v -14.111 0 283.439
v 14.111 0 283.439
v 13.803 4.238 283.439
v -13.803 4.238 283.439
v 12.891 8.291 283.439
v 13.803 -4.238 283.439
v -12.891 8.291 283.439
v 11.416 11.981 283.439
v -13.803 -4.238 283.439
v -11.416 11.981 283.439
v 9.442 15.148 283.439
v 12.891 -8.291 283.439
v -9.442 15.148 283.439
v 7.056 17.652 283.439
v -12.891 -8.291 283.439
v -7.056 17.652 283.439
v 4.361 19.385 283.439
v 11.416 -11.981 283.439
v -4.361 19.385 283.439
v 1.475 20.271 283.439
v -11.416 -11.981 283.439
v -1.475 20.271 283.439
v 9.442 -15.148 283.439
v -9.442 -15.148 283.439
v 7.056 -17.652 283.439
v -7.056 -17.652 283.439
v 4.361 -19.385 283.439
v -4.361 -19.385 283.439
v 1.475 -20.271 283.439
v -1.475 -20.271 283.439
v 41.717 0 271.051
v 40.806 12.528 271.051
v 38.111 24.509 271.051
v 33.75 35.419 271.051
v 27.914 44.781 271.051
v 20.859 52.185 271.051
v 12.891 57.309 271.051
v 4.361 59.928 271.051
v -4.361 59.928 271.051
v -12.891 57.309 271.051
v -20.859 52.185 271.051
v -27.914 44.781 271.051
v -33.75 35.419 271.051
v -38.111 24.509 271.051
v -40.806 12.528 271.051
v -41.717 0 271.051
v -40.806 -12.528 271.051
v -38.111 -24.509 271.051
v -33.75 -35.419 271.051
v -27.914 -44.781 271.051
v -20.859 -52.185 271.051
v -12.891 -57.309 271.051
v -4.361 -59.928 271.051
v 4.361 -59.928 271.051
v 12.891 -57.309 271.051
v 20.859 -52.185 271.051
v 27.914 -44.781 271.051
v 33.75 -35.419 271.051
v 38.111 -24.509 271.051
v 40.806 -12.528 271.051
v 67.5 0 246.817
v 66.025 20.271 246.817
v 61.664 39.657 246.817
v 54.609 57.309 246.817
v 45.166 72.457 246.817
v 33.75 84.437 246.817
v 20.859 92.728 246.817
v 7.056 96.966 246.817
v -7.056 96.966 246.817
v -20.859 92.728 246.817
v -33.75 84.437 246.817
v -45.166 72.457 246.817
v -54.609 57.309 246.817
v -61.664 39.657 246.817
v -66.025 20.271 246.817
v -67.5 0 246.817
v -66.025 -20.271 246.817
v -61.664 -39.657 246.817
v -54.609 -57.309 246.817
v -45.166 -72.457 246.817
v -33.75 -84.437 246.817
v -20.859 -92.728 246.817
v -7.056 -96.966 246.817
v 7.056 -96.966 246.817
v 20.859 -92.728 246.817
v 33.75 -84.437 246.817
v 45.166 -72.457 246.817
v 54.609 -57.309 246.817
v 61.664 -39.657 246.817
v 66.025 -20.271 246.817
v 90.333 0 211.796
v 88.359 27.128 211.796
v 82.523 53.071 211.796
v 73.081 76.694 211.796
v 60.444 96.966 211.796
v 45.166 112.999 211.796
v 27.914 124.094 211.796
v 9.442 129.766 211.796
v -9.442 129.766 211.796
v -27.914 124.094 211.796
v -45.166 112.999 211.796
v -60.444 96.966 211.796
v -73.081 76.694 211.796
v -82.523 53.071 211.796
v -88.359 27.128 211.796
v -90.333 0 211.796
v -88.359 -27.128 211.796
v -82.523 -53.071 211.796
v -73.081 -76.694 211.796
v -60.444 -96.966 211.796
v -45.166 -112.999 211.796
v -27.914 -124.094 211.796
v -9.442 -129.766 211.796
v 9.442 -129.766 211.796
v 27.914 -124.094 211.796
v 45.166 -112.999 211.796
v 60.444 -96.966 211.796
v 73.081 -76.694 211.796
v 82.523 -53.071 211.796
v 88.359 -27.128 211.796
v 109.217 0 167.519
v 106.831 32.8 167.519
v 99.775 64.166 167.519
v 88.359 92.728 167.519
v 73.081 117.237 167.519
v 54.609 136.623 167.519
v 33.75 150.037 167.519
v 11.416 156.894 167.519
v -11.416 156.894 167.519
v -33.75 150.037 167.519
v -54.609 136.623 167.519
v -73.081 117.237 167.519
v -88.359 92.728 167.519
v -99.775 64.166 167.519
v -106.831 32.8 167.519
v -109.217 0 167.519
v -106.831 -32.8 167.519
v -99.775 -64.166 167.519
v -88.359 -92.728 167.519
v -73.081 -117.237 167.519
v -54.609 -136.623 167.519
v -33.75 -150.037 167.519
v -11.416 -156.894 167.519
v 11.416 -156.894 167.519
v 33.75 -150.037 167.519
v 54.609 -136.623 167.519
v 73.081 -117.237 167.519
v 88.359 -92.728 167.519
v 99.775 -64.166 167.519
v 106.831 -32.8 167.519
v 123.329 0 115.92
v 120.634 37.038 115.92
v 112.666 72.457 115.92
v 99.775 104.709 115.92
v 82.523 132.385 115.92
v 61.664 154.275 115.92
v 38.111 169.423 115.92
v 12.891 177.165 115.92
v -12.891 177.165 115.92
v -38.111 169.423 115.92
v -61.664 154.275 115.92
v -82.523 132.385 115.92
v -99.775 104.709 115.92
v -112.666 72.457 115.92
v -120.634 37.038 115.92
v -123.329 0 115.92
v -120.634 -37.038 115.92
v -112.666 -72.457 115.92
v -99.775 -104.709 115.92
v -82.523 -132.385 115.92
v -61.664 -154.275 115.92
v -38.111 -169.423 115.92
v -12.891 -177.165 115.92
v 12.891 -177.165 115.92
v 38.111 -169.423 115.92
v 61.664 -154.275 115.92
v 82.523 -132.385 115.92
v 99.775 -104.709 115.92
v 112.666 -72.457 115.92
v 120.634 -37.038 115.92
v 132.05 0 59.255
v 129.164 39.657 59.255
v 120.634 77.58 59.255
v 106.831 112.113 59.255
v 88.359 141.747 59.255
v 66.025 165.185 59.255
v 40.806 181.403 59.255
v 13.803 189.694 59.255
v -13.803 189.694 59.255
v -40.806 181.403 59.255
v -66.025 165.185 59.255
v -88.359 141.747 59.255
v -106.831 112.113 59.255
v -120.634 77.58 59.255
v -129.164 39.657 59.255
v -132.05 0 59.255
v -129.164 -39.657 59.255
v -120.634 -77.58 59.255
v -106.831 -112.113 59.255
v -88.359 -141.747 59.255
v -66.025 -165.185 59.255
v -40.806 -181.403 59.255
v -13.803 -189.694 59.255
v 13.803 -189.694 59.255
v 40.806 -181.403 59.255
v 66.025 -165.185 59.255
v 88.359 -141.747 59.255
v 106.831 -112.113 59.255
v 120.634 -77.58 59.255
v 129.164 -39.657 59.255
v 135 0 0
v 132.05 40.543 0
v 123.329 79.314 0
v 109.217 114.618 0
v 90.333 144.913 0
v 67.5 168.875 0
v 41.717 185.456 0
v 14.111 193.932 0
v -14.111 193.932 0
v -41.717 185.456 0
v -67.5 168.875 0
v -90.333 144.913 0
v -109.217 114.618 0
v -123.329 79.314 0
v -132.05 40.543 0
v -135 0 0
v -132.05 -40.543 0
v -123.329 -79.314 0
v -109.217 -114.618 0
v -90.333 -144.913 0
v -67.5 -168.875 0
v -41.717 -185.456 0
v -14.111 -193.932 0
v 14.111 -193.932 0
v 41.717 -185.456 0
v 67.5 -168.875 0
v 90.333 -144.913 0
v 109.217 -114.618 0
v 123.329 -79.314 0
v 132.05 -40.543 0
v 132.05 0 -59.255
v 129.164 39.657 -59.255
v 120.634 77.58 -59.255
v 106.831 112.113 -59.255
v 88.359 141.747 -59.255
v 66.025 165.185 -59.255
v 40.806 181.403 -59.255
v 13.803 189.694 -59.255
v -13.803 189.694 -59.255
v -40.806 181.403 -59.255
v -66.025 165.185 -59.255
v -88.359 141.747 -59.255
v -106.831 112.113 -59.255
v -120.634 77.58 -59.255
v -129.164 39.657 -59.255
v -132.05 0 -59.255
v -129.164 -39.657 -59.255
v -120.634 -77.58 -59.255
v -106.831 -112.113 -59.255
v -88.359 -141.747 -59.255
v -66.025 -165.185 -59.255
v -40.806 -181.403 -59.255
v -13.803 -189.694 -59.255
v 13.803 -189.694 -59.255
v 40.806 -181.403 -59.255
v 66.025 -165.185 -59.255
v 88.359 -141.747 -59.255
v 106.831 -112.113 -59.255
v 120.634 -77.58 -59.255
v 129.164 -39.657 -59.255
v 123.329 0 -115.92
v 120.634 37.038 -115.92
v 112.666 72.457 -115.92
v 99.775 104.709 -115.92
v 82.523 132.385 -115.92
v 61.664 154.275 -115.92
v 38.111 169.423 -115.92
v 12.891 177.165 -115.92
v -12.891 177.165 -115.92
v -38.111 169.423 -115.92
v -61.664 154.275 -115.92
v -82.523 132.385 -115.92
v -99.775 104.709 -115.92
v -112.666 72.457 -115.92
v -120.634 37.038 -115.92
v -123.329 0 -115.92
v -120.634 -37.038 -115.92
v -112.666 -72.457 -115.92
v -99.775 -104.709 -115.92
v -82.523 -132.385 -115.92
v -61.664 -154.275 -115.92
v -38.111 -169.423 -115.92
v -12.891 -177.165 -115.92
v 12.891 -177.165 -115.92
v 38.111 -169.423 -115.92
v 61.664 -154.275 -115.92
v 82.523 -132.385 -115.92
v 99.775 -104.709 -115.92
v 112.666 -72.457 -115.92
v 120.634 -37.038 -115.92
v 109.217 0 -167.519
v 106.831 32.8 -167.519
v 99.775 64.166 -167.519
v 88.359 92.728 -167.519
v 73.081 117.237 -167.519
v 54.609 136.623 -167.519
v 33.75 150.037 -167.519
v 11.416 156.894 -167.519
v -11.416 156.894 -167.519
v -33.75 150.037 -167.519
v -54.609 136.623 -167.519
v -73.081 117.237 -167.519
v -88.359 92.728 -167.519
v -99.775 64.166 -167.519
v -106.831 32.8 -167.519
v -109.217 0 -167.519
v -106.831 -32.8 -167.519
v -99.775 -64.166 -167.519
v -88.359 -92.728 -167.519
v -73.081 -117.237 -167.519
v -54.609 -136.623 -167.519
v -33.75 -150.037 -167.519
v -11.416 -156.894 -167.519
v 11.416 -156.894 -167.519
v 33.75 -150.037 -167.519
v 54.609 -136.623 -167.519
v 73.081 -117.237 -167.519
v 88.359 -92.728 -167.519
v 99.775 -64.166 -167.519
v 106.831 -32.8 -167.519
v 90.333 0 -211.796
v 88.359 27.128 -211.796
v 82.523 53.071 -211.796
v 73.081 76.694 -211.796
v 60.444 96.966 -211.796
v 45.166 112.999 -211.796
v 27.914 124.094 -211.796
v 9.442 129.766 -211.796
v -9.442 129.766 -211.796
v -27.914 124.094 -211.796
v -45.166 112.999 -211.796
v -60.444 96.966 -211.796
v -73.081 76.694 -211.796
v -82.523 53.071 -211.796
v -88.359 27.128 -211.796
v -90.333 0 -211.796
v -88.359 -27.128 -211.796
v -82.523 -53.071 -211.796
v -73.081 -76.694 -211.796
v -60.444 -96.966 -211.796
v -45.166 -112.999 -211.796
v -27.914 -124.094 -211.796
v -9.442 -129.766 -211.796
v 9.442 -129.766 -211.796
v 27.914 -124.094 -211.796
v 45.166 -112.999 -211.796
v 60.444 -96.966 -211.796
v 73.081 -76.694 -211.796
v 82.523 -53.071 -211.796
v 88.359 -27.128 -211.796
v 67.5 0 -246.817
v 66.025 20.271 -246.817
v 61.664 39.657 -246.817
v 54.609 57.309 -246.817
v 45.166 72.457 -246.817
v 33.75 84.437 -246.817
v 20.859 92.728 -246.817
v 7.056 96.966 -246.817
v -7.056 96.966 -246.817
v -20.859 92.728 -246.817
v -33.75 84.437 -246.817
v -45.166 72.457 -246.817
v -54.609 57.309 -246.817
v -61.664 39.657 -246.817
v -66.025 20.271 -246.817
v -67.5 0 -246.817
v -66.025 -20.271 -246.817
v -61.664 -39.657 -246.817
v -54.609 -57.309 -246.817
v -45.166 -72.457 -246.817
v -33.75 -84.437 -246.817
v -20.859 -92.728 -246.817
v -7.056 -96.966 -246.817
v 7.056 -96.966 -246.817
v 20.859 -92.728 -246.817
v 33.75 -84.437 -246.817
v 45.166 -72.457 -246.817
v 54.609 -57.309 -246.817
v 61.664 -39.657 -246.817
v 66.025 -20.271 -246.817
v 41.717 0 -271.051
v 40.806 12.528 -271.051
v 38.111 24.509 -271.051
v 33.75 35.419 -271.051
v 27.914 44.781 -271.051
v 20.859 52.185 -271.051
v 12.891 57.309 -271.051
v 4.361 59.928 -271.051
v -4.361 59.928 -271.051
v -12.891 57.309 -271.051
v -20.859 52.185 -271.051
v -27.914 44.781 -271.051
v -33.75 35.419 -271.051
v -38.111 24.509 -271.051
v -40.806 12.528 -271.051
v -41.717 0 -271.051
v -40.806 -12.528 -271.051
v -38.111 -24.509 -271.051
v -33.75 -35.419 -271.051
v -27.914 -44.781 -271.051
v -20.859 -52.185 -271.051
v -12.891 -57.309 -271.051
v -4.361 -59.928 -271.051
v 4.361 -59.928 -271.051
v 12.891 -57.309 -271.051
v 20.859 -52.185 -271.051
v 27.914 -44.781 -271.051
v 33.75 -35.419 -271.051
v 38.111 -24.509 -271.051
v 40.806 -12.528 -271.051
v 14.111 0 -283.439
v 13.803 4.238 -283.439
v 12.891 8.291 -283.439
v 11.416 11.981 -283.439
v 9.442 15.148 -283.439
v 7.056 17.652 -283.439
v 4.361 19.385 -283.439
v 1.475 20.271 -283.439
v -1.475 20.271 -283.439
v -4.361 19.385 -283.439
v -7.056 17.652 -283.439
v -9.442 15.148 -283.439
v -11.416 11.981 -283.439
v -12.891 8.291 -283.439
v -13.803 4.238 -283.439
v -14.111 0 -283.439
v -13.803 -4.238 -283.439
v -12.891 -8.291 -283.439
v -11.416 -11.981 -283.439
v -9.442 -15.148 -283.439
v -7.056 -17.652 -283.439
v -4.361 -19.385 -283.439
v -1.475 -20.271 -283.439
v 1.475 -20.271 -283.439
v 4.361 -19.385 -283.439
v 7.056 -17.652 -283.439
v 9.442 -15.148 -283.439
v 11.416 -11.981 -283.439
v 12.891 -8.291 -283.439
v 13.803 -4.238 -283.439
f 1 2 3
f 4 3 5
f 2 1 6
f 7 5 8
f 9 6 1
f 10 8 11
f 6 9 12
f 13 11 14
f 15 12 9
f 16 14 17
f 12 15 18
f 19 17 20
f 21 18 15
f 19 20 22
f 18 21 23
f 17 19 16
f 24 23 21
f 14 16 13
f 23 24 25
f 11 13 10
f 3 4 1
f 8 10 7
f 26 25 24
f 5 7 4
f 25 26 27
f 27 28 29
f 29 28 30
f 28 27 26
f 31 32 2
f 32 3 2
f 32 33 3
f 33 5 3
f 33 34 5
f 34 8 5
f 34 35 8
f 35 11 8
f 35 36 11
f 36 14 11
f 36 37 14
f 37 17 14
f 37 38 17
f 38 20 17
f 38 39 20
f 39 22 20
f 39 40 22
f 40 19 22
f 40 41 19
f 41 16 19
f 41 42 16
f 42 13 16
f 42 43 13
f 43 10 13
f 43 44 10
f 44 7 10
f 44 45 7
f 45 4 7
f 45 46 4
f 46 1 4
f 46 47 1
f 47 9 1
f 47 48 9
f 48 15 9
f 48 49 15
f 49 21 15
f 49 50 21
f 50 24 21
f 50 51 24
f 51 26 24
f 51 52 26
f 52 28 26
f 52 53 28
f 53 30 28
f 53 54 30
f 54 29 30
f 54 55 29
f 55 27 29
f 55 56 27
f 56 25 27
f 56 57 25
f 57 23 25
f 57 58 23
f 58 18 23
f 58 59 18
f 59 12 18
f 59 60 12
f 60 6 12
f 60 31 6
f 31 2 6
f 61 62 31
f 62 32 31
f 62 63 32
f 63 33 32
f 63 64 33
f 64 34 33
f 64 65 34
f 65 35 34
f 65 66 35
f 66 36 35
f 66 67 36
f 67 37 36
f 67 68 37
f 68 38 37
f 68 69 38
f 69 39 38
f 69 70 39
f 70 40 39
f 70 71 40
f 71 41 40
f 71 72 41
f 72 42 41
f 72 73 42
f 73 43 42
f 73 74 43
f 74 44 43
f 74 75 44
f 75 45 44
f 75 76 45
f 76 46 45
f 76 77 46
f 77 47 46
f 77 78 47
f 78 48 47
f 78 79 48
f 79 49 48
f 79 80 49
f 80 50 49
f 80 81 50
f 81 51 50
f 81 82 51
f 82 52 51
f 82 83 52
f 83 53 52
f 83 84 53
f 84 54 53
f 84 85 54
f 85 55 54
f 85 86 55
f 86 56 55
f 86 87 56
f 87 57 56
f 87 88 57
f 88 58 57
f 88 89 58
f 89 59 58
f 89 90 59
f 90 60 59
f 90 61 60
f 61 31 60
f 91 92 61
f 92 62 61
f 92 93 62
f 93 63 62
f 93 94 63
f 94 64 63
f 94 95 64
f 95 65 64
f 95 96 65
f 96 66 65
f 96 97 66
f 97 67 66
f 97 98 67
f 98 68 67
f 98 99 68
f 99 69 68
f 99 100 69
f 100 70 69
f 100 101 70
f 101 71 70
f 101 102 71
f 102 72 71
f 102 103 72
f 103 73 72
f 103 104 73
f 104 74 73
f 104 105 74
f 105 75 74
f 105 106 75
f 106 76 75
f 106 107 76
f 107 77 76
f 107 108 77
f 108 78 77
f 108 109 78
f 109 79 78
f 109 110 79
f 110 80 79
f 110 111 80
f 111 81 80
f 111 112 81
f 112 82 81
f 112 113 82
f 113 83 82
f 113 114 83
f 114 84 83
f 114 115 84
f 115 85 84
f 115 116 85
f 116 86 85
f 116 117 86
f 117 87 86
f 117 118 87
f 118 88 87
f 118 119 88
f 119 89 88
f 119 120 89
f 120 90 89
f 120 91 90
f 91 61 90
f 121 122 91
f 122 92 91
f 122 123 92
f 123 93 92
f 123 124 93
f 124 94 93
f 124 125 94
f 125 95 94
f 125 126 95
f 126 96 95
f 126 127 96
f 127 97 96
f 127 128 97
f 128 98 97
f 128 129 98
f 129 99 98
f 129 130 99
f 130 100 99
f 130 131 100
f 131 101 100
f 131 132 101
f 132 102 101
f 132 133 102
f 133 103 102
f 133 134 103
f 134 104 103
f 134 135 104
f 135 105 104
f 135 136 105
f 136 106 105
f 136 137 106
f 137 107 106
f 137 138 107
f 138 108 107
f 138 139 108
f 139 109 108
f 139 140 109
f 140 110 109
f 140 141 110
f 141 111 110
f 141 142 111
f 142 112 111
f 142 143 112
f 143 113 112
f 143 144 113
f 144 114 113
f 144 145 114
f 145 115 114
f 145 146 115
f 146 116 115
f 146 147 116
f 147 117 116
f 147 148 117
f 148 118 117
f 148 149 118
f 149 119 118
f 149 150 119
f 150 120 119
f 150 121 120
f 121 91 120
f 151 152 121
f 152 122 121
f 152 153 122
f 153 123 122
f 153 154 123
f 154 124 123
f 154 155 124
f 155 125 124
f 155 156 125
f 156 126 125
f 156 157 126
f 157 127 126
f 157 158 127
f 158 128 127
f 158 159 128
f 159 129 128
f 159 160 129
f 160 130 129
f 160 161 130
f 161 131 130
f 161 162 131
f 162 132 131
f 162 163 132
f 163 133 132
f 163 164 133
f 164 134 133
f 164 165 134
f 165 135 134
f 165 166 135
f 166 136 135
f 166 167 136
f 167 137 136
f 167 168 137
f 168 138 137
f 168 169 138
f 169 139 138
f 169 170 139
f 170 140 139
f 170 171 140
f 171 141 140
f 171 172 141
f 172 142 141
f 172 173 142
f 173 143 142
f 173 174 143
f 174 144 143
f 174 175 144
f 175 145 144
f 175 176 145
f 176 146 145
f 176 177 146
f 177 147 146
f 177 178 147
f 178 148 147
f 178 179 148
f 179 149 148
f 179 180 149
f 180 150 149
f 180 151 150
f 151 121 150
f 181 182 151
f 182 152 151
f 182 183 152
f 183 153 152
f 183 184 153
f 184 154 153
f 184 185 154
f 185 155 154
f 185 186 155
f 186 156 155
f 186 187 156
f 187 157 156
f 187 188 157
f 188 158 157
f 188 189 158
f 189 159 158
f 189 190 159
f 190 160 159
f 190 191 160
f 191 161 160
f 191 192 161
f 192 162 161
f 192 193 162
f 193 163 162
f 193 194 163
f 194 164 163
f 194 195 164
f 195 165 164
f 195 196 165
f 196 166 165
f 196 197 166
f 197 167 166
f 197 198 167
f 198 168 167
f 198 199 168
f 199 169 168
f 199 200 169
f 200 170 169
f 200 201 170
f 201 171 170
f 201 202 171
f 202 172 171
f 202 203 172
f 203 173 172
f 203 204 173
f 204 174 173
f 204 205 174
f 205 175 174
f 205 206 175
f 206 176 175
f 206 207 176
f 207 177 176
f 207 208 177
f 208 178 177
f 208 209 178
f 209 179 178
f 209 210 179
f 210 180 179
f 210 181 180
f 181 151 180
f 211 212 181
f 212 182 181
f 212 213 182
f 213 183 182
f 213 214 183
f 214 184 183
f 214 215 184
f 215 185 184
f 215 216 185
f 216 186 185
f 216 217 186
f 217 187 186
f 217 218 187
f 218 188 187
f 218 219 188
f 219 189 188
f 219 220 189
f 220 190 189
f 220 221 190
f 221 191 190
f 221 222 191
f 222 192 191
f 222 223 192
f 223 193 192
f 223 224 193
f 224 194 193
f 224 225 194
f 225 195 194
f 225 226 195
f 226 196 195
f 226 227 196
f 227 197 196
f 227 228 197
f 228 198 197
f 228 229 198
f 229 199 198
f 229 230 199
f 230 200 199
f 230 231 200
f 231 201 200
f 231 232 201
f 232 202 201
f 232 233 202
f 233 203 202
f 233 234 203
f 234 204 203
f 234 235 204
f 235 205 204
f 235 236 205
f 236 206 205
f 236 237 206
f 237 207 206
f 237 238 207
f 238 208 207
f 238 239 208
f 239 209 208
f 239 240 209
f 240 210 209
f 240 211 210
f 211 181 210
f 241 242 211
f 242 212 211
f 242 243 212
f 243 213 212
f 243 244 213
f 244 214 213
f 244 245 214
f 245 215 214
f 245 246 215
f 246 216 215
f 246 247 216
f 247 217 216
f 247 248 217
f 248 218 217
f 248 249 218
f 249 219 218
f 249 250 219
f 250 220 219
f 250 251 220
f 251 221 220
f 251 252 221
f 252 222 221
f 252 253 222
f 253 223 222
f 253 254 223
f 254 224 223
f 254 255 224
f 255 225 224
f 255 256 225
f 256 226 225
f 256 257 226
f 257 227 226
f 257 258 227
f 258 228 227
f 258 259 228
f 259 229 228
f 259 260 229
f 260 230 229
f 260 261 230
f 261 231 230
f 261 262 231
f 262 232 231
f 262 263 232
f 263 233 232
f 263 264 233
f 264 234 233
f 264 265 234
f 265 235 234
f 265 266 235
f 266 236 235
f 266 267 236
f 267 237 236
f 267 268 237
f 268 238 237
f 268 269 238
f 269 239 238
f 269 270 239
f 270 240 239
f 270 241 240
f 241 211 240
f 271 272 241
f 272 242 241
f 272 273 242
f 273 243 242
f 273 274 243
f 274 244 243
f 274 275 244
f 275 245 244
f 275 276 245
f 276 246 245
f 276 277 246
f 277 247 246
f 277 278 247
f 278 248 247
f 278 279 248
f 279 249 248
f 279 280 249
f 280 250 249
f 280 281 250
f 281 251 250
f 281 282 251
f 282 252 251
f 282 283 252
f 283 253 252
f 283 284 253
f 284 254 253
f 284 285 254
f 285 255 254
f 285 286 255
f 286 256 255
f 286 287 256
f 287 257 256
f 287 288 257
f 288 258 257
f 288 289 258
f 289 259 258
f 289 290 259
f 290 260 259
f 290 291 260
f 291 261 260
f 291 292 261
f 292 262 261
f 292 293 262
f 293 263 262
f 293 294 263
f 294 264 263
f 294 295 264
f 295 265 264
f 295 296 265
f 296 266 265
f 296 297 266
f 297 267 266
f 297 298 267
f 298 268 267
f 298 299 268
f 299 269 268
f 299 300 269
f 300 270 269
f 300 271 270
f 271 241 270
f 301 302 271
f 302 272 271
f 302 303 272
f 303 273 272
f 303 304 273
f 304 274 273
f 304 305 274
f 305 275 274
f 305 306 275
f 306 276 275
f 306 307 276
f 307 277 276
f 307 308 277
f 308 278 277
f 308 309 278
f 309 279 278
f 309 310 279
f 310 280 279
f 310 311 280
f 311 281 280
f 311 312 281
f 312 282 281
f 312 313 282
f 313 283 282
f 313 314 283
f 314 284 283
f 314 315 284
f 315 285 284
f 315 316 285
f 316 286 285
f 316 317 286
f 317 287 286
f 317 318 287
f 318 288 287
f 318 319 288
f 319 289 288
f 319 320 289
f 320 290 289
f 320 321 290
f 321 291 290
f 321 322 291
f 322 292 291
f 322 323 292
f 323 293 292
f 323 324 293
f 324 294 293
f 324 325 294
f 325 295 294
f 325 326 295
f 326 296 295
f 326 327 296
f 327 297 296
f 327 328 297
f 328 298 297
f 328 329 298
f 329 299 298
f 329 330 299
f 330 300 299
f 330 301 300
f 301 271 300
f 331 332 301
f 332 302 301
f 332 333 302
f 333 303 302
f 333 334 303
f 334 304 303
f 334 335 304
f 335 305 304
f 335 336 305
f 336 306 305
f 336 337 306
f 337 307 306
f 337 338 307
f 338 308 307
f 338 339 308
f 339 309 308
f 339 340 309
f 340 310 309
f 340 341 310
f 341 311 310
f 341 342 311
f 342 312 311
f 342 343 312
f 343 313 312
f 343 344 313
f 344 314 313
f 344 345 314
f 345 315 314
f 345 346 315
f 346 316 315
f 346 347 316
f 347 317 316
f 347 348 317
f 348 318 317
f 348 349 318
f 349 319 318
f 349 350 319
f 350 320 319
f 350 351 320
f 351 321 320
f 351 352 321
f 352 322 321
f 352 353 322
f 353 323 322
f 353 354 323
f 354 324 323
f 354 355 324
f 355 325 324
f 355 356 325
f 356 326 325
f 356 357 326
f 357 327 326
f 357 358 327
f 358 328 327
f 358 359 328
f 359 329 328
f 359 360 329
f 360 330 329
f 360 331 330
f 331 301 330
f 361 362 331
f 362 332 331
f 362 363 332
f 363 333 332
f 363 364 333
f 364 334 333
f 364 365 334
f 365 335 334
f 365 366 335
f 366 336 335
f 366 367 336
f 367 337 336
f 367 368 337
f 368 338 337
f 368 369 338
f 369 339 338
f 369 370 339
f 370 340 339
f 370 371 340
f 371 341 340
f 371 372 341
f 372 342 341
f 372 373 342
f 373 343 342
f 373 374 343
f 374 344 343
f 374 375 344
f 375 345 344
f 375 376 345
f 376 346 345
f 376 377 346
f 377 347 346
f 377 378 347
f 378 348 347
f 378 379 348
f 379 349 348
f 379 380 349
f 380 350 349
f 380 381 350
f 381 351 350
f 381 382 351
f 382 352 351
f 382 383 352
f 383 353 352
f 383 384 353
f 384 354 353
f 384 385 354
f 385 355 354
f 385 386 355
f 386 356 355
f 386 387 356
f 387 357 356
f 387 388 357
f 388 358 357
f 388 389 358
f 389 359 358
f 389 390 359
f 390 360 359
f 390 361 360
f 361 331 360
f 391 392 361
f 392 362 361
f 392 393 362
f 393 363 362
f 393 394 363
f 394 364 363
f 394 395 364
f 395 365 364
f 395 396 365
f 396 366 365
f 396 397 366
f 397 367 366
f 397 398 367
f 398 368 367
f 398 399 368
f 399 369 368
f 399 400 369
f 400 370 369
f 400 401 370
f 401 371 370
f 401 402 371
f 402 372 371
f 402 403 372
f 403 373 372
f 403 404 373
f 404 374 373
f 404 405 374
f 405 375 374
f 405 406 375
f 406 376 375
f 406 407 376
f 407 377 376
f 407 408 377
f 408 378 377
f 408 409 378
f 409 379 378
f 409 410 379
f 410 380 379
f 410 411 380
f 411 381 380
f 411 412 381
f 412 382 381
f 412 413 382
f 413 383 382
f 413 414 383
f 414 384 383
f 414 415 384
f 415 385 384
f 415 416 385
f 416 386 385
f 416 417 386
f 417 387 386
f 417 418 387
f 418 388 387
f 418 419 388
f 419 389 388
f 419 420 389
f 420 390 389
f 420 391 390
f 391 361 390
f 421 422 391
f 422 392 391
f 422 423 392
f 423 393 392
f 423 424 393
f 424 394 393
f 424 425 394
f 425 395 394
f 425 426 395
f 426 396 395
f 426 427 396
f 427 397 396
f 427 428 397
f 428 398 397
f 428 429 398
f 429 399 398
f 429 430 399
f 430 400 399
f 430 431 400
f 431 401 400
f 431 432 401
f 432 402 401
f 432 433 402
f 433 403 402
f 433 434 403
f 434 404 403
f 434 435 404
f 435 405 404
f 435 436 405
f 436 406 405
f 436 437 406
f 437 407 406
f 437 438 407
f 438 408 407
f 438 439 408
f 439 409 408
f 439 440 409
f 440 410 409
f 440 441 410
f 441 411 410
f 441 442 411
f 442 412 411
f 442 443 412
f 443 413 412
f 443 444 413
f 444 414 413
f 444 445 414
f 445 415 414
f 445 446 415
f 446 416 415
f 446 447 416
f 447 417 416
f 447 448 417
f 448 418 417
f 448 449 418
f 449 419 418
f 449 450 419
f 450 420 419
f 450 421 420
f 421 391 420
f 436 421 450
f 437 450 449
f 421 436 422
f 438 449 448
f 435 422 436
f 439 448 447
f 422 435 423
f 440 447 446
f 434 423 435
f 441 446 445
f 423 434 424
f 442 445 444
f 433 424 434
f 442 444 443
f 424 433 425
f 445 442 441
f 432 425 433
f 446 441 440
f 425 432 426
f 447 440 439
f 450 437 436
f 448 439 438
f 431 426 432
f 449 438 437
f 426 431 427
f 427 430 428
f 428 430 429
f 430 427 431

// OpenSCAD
// Generated by SolidPython 1.0.1 on 2020-07-29 00:46:49


scale(v = [9, 13, 19]) {
	sphere(r = 15);
}
/***********************************************
*********      SolidPython code:      **********
************************************************
 
# import packages: SolidPython
from solid import *
from solid.utils import *
from itertools import chain, combinations, permutations


class Resize:

    def __init__(self, scad_file):
        self.scad_file = scad_file
        #self.scad_file = import_scad(scad_file)
        # cone/cylinder param:
        self.r1 = 0
        self.r2 = 0
        self.h = 0
        # rectangular prism param:
        self.w = 0
        self.l = 0
        # ellipse param:
        self.r = 0

    # import OpenScad code (file name corresponds to shape)


    # classify shape + parameters
    def assign(self, param1, param2, param3):
        if self.scad_file == 'cone.scad':
            self.r1 = param1
            self.r2 = param2
            self.h = param3
        elif self.scad_file == 'cylinder.scad':
            self.r1 = param1
            self.r2 = param2
            self.h = param3
        elif self.scad_file == 'rectangularPrism.scad':
            self.h = param1
            self.l = param2
            self.w = param3
        else:
            self.r = param1
            self.h = param2

    # resize parameters
    def iterate(self):
        x = range(3, 20, 2)
        i = 1
        if self.scad_file == 'cone.scad':
            tempList = list(permutations(x, 2))
            for temp in tempList:
                param1 = temp[0]
                param2 = temp[1]
                filepath = 'produced_scad_files/' + 'cone' + str(param1) + '_' + str(param2) + '_' + '.scad'
                scad_render_to_file(cylinder(h=param1, r1=param2, r2=0), filepath)

        elif self.scad_file == 'cylinder.scad':
            tempList = list(permutations(x, 3))
            for temp in tempList:
                param1 = temp[0]
                param2 = temp[1]
                filepath = 'produced_scad_files/' + 'cylinder' + str(param1) + '_' + str(param2) + '_' + '.scad'
                scad_render_to_file(cylinder(h=param1, r1=param2, r2=param2), filepath)

        elif self.scad_file == 'rectangularPrism.scad':
            tempList = list(permutations(x, 3))
            for temp in tempList:
                param1 = temp[0]
                param2 = temp[1]
                param3 = temp[2]
                filepath = 'produced_scad_files/' + 'rectangularPrism' + str(param1) + '_' + str(param2) + '_' + str(
                    param3) + '.scad'
                scad_render_to_file(cube(size=(param1, param2, param3)), filepath)

        elif self.scad_file == 'ellipse.scad':
            tempList = list(permutations(x, 4))
            for temp in tempList:
                param1 = temp[0]
                param2 = temp[1]
                param3 = temp[2]
                param4 = temp[3]
                filepath = 'produced_scad_files/' + 'ellipse' + str(param1) + '_' + str(param2) + '_' + str(param3) + '_' + str(param4) + '.scad'
                scad_render_to_file(scale([param1, param2, param3])(sphere(r=param4)), filepath)

    def render_to_scadfile(self):
        scad_render_to_file(scad, 'example.scad') 
 
************************************************/
